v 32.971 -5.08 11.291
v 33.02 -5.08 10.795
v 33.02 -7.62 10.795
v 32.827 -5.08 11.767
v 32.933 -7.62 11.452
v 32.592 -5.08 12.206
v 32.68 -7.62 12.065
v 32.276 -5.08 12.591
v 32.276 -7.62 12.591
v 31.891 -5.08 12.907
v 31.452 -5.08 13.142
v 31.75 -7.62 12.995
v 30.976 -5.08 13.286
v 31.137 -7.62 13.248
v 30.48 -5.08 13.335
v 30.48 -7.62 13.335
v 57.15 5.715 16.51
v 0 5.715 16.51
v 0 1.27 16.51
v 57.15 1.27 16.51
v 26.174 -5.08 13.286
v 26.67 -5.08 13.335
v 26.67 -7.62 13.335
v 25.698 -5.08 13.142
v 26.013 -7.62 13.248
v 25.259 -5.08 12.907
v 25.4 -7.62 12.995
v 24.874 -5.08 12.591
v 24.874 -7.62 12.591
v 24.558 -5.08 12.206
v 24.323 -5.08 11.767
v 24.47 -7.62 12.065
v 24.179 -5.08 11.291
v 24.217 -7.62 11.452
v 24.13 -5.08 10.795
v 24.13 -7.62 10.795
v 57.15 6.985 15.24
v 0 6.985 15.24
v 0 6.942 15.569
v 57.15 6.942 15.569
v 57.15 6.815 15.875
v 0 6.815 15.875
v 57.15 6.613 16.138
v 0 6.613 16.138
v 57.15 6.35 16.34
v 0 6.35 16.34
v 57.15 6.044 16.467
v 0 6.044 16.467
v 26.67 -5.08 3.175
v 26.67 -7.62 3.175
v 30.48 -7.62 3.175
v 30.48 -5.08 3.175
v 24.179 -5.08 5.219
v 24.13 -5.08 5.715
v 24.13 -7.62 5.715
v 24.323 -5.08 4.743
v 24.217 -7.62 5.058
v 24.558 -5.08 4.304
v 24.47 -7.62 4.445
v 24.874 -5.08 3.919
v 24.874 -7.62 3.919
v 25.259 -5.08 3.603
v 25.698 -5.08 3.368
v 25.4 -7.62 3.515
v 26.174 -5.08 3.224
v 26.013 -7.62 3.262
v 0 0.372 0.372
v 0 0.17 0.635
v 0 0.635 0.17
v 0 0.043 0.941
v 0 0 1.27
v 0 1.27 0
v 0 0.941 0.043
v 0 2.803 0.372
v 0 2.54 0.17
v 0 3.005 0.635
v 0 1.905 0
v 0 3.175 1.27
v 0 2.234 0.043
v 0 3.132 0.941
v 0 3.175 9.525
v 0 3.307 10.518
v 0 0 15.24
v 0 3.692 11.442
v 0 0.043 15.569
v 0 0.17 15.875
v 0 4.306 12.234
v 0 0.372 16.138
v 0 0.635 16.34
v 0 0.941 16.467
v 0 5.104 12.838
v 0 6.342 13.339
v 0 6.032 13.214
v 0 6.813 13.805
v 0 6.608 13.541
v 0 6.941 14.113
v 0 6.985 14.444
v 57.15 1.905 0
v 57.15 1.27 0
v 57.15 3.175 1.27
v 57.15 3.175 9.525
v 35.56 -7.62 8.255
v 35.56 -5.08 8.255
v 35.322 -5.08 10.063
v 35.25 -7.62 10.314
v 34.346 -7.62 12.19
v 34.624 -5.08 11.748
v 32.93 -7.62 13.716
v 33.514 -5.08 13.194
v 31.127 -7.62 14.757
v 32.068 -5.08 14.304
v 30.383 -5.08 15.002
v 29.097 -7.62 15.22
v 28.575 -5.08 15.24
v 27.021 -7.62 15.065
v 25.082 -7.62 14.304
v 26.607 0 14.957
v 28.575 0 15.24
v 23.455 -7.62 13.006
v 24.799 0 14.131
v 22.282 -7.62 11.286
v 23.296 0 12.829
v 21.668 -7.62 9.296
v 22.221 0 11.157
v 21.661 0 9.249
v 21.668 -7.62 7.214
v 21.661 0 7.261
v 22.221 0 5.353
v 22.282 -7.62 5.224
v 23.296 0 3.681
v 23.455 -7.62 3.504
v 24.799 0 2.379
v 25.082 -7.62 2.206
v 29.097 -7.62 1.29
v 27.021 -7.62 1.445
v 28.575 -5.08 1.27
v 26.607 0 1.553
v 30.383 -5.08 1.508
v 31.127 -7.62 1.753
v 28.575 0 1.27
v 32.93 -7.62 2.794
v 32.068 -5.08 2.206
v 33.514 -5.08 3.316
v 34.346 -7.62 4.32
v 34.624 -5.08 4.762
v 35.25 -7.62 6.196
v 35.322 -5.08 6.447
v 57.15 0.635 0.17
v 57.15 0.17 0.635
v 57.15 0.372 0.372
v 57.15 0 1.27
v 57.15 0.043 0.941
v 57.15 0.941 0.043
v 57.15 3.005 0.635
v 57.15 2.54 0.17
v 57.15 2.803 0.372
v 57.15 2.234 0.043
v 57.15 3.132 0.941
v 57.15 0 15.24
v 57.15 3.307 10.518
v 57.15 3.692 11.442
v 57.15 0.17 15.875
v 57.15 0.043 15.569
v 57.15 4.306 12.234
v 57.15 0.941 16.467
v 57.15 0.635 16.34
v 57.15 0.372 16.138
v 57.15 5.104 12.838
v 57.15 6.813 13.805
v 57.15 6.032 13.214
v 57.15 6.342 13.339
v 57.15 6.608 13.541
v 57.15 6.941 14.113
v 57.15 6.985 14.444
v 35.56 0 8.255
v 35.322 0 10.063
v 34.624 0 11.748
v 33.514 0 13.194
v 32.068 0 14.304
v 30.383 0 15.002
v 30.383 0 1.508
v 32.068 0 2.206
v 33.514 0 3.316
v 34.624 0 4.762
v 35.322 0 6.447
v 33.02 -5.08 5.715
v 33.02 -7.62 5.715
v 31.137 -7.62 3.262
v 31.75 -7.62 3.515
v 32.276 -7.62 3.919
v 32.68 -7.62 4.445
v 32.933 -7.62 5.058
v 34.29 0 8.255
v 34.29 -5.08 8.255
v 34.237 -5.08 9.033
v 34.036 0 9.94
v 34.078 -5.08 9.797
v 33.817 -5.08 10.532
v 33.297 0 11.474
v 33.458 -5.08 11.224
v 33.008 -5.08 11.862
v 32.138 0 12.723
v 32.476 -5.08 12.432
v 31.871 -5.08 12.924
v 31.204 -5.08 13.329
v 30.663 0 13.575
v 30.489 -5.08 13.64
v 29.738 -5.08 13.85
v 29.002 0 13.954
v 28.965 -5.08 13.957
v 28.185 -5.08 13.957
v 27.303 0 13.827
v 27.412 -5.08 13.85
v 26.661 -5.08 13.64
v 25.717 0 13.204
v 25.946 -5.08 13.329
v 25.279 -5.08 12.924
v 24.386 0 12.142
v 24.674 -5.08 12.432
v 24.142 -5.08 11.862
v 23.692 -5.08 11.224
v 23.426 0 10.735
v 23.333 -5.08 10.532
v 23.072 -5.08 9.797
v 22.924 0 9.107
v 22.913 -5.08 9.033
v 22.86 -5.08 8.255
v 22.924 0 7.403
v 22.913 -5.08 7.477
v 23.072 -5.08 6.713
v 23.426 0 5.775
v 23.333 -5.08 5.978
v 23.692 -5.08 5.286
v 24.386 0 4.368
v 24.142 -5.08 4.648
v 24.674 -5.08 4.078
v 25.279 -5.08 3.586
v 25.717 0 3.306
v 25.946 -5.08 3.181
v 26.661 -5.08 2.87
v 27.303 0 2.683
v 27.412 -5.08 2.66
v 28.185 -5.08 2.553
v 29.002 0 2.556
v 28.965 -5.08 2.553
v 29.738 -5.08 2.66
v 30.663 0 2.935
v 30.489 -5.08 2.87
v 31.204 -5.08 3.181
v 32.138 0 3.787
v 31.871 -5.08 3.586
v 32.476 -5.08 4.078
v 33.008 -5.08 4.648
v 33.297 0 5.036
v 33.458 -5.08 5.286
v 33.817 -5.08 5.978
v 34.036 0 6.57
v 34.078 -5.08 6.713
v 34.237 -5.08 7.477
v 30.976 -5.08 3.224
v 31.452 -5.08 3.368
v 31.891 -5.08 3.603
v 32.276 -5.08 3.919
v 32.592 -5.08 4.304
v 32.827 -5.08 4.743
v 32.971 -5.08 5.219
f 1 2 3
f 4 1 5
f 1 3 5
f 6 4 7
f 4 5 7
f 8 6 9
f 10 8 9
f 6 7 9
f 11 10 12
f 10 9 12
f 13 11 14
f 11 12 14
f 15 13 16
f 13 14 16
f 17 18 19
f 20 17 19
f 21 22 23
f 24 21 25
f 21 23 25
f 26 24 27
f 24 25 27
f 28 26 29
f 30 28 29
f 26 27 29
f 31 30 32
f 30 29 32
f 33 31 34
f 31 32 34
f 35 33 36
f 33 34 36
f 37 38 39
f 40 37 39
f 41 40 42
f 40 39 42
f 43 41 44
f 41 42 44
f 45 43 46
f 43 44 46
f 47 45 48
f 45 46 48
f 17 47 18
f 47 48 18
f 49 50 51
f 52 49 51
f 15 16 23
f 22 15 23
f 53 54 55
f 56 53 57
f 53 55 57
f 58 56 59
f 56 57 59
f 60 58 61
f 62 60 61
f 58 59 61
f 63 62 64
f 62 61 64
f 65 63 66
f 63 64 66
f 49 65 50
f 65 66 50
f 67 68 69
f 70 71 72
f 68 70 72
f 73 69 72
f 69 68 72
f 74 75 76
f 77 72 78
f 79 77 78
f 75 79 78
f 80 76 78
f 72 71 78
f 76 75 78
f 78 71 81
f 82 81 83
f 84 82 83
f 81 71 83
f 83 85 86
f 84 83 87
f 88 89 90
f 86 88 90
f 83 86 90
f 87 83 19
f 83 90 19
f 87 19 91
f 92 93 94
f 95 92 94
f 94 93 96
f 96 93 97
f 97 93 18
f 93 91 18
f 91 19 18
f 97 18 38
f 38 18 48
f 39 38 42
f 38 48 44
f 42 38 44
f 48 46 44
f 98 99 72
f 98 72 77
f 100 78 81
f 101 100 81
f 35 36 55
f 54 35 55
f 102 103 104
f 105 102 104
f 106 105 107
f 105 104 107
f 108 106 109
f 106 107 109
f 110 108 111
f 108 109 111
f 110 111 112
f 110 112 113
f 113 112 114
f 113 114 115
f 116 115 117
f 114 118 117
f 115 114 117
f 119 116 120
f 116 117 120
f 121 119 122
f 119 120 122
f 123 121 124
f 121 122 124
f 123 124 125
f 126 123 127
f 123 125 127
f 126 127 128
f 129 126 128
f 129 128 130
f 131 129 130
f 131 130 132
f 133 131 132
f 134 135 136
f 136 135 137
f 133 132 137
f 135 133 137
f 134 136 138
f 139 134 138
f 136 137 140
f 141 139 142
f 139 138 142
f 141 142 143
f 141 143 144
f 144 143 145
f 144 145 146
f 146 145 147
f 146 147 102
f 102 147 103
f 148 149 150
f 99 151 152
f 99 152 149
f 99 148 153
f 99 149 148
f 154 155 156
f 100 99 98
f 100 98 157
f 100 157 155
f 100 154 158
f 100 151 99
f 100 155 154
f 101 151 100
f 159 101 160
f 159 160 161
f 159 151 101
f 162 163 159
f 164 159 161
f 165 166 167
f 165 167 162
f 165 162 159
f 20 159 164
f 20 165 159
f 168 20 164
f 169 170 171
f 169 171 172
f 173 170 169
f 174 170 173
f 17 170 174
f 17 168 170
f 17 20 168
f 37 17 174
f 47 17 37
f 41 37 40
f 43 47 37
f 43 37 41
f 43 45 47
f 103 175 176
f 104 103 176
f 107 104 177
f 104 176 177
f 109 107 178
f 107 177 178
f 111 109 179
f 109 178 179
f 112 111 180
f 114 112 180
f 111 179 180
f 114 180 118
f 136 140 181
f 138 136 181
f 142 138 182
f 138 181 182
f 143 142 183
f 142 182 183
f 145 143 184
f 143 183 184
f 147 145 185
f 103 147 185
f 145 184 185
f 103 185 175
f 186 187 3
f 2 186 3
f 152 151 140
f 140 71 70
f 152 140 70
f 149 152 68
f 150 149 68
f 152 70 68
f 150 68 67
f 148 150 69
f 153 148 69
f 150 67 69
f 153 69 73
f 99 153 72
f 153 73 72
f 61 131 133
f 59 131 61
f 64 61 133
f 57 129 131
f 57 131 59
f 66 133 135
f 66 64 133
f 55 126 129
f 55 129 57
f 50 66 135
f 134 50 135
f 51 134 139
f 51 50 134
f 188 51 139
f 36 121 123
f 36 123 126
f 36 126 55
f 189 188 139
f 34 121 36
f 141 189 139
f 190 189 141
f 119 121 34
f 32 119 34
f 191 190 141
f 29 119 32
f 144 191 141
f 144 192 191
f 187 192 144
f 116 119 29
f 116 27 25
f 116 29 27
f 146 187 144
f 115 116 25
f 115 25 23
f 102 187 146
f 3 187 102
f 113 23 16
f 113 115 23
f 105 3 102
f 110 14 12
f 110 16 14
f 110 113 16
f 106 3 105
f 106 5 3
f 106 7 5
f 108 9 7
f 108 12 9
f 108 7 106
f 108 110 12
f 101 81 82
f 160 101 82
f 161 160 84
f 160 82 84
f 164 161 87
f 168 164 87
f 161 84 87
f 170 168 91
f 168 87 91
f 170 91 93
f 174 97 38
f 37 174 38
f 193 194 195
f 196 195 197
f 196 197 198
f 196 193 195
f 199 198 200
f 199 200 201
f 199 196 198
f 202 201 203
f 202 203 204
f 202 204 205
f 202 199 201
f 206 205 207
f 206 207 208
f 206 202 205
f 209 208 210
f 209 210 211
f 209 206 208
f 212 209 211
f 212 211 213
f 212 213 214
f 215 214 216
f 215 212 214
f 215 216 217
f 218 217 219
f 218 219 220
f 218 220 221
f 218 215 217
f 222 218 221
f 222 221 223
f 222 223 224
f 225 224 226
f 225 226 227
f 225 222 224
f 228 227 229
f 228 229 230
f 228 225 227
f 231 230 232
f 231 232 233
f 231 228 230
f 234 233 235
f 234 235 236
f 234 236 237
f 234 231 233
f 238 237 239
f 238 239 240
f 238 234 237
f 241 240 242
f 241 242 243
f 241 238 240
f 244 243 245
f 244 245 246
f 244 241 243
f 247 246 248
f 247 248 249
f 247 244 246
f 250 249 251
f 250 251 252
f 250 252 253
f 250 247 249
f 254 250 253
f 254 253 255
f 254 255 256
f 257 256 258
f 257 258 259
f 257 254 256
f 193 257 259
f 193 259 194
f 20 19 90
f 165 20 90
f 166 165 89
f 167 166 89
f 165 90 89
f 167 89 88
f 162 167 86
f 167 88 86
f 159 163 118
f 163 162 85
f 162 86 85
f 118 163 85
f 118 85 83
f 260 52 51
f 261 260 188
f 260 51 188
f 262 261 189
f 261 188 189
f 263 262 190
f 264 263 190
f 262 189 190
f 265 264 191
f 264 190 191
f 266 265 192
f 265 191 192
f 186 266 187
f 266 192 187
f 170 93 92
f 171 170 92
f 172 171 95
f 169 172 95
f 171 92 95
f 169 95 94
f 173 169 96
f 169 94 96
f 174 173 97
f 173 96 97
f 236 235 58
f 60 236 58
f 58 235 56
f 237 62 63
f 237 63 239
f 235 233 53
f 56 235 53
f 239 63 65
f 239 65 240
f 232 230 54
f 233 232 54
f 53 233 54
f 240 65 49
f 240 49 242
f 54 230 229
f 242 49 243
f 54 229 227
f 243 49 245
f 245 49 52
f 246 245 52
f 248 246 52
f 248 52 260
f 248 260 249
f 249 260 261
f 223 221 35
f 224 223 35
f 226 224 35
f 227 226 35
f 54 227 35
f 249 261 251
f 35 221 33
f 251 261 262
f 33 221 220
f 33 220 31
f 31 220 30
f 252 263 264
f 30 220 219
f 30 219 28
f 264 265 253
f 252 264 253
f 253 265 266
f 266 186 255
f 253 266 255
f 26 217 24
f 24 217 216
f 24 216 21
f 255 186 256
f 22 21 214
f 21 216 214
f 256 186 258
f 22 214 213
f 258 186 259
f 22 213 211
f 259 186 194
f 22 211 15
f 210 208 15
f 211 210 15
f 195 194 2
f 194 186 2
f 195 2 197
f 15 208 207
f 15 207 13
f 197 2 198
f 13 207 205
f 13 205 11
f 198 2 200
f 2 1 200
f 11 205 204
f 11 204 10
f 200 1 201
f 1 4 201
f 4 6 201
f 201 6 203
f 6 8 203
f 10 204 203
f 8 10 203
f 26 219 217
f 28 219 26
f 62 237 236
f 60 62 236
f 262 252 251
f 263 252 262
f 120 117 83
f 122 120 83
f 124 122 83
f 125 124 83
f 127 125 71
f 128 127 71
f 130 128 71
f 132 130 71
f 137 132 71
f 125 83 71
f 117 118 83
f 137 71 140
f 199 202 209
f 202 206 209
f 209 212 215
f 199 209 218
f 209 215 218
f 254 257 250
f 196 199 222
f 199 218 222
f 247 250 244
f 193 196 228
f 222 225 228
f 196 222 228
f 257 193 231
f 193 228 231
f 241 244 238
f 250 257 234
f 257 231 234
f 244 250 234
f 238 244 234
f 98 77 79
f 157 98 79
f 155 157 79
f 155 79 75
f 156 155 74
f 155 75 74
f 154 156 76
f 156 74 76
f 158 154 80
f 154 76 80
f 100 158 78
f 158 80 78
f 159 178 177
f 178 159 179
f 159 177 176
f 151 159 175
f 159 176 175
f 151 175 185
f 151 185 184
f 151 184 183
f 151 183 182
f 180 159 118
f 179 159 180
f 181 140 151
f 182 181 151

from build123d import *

# Parameters (mm, degrees)
F1_DEPTH = 57.15
F2_R     = 5.715
F3_DEPTH = 5.08
F4_R     = 6.985
F5_DEPTH = 2.54
F7_DEPTH = 5.08


with BuildPart() as f1:
    # F0 (on Right) → F1 (new body)
    with BuildSketch(Plane.YZ):
        with BuildLine():
            Line((0, 10.16), (0, 1.27))
            ThreePointArc((0, 1.27), (0.371974, 0.371974), (1.27, 0))
            Line((1.27, 0), (1.905, 0))
            ThreePointArc((1.905, 0), (2.803026, 0.371974), (3.175, 1.27))
            Line((3.175, 1.27), (3.175, 9.525))
            ThreePointArc((3.175, 9.525), (3.972931, 11.858139), (6.0325, 13.214017))
            ThreePointArc((6.0325, 13.214017), (6.719023, 13.665976), (6.985, 14.443689))
            Line((6.985, 14.443689), (6.985, 15.24))
            ThreePointArc((6.985, 15.24), (6.613026, 16.138026), (5.715, 16.51))
            Line((5.715, 16.51), (1.27, 16.51))
            ThreePointArc((1.27, 16.51), (0.371974, 16.138026), (0, 15.24))
            Line((0, 15.24), (0, 10.16))
        make_face()
    extrude(amount=F1_DEPTH)

    # F2 (on face) → F3 (join)
    with BuildSketch(Plane.XZ):
        with BuildLine():
            ThreePointArc((28.575, 1.27), (33.514141, 3.315859), (35.56, 8.255))
            ThreePointArc((35.56, 8.255), (33.514141, 13.194141), (28.575, 15.24))
            ThreePointArc((28.575, 15.24), (21.59, 8.255), (28.575, 1.27))
        make_face()
        with Locations((28.575, 8.255)):
            Circle(F2_R, mode=Mode.SUBTRACT)
    extrude(amount=F3_DEPTH)

    # F4 (on face) → F5 (join)
    with BuildSketch(Plane.XZ.offset(5.08)):
        with Locations((28.575, 8.255)):
            Circle(F4_R)
    extrude(amount=F5_DEPTH)

    # F6 (on face) → F7 (cut)
    with BuildSketch(Plane.XZ.offset(7.62)):
        with BuildLine():
            Line((30.48, 13.335), (28.575, 13.335))
            Line((28.575, 13.335), (26.67, 13.335))
            ThreePointArc((26.67, 13.335), (24.873949, 12.591051), (24.13, 10.795))
            Line((24.13, 10.795), (24.13, 5.715))
            ThreePointArc((24.13, 5.715), (24.873949, 3.918949), (26.67, 3.175))
            Line((26.67, 3.175), (30.48, 3.175))
            ThreePointArc((30.48, 3.175), (32.276051, 3.918949), (33.02, 5.715))
            Line((33.02, 5.715), (33.02, 8.255))
            Line((33.02, 8.255), (33.02, 10.795))
            ThreePointArc((33.02, 10.795), (32.276051, 12.591051), (30.48, 13.335))
        make_face()
    extrude(amount=-F7_DEPTH, mode=Mode.SUBTRACT)


solid = f1.part
